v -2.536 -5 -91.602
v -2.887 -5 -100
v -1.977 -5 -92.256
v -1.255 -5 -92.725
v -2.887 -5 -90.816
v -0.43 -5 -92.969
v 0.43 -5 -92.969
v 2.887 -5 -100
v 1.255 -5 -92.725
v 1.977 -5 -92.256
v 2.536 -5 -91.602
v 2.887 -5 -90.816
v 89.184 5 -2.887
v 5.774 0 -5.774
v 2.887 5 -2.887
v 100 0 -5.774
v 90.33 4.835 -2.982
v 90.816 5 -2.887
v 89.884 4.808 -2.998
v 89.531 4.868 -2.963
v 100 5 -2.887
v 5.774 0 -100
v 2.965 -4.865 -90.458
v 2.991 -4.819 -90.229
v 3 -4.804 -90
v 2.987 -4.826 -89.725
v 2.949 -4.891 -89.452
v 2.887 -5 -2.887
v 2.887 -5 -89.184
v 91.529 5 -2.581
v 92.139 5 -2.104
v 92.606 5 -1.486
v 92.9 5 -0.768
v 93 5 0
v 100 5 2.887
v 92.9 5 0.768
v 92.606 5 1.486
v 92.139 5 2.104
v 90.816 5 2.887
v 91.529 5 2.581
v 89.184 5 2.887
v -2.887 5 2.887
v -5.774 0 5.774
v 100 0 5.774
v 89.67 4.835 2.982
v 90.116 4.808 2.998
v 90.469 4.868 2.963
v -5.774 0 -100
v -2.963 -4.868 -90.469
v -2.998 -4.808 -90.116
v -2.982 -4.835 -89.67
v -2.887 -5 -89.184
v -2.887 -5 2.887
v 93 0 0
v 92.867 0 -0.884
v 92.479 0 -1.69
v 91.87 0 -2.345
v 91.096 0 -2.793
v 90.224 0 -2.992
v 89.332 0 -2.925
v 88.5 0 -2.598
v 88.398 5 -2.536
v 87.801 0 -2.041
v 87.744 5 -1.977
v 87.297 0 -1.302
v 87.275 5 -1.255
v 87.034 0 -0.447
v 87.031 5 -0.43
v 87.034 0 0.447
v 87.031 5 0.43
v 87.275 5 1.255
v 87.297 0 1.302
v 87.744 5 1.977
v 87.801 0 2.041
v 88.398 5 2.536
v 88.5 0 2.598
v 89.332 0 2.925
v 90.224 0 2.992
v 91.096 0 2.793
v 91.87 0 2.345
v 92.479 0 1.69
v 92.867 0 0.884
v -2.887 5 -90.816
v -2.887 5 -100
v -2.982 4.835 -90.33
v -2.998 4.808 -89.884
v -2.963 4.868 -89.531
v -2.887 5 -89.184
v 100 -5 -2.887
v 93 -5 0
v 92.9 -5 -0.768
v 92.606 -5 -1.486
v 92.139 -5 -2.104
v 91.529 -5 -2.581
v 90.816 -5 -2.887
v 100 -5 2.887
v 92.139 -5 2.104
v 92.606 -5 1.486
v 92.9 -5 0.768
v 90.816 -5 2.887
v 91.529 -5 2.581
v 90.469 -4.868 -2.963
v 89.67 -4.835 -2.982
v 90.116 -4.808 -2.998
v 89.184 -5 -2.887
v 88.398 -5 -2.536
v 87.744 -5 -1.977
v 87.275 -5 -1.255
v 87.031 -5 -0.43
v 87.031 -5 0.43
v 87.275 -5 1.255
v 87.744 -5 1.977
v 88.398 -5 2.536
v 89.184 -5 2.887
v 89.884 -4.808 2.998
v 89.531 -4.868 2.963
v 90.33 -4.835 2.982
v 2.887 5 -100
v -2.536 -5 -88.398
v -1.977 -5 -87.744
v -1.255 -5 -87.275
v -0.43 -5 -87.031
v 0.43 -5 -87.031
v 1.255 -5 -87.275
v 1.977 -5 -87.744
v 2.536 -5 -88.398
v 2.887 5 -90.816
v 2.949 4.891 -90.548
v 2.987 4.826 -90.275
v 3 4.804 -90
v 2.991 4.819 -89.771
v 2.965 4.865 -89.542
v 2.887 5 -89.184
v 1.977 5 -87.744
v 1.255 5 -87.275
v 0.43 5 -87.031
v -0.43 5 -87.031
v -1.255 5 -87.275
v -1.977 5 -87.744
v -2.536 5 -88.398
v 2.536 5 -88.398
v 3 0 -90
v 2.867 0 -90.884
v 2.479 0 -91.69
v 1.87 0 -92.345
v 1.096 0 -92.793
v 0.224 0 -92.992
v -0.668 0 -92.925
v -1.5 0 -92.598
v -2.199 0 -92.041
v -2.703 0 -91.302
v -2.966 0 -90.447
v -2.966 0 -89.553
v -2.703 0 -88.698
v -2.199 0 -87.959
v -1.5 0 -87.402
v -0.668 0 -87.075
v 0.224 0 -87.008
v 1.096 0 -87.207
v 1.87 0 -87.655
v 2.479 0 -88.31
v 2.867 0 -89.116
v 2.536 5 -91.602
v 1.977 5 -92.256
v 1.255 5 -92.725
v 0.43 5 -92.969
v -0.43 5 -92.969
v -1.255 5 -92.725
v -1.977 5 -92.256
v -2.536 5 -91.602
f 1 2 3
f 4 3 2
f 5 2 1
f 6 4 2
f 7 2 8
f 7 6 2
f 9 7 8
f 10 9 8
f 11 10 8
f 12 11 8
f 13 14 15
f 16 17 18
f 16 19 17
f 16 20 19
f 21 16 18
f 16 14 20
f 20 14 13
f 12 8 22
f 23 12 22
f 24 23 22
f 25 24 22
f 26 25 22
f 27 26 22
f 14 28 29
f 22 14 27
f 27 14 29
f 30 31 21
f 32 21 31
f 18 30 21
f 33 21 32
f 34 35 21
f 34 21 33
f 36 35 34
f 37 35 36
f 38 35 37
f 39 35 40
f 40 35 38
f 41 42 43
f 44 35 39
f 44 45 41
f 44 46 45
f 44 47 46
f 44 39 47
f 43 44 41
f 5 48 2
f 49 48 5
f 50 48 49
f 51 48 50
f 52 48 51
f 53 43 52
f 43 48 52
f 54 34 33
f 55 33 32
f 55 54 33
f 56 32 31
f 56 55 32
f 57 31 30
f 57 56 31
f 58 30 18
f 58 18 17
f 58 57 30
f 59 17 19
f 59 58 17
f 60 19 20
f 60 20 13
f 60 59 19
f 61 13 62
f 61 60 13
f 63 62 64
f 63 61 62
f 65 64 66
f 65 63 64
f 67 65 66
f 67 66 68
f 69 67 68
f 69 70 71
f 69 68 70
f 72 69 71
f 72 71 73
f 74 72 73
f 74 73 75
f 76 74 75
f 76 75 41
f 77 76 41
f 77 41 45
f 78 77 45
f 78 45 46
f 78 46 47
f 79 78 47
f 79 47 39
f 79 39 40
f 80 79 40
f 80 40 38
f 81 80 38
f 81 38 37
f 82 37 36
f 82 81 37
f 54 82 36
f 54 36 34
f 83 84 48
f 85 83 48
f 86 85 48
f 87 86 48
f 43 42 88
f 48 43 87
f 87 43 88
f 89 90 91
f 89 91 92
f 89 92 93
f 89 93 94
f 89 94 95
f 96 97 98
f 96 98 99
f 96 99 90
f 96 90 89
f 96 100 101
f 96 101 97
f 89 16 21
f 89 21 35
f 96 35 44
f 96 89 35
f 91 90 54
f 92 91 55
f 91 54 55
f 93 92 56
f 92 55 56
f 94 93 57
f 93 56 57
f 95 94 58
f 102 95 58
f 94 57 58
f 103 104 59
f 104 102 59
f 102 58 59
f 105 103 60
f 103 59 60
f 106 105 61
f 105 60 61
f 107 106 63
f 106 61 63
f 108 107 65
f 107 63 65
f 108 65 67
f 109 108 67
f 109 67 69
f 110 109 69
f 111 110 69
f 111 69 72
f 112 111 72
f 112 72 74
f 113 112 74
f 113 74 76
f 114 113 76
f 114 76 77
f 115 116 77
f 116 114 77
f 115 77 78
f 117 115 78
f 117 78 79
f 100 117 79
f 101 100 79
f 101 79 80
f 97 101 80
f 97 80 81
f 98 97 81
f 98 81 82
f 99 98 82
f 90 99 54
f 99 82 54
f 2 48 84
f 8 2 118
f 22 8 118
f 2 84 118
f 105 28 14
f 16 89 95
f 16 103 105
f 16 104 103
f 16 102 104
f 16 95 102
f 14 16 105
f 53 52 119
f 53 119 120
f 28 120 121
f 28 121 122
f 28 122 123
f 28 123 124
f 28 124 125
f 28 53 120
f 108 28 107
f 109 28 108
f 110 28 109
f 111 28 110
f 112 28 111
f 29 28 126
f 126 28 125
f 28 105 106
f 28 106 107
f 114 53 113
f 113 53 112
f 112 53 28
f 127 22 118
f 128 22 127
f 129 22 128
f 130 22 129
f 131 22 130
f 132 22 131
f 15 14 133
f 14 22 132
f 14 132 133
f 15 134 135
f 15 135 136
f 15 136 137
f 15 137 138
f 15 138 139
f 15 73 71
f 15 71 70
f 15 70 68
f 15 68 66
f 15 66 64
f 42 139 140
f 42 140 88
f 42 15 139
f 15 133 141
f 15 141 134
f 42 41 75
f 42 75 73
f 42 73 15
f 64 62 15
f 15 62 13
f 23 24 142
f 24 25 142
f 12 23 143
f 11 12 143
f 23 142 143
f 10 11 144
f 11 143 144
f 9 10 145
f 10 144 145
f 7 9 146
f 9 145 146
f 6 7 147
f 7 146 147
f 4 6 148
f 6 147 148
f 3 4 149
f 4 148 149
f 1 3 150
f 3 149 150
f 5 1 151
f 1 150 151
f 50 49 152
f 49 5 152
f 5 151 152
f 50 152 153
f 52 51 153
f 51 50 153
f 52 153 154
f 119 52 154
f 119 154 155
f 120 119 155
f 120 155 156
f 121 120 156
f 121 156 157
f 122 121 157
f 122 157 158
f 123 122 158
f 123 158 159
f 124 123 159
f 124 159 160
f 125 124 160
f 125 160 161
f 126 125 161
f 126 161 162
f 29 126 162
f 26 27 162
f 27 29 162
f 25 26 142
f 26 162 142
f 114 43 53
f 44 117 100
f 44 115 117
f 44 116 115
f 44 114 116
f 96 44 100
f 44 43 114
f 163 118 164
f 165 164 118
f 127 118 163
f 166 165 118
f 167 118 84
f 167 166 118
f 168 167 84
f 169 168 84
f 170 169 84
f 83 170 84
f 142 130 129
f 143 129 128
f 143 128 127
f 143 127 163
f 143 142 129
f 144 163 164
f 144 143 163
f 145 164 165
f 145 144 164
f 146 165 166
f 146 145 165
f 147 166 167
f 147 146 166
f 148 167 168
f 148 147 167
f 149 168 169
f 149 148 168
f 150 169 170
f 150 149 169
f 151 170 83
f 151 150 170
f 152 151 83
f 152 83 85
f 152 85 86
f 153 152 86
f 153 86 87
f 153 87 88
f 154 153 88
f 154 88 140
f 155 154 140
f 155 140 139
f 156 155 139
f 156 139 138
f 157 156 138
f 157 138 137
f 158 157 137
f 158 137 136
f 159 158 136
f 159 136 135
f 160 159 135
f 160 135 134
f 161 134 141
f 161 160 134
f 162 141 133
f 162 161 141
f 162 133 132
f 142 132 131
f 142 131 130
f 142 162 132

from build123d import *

# Parameters (mm, degrees)
SKETCH3_R               = 3
CUT_EXTRUDE1_DEPTH      = 6
CUT_EXTRUDE1_DEPTH_BACK = 6


with BuildPart() as part:
    # Sweep1: sweep along a path in Sketch1
    with BuildLine(Plane(origin=(0, 0, 0), x_dir=(1, 0, 0), z_dir=(0, 1, 0))) as sweep1_path:
        Line((0, 100), (0, 0))
        Line((0, 0), (100, 0))
    # Sketch2 → Sweep1 (sweep)
    with BuildSketch(Plane.XY.offset(-100)):
        Polygon((5.773502692, 0), (2.886751346, 5), (-2.886751346, 5), (-5.773502692, 0), (-2.886751346, -5), (2.886751346, -5), align=None)
    sweep(path=sweep1_path.line, transition=Transition.RIGHT)

    # Sketch3 → Cut-Extrude1 (cut, two sides)
    with BuildSketch(Plane(origin=(0, 0, 0), x_dir=(1, 0, 0), z_dir=(0, 1, 0))) as cut_extrude1_sk:
        with Locations((0, 90)):
            Circle(SKETCH3_R)
        with Locations((90, 0)):
            Circle(SKETCH3_R)
    extrude(amount=CUT_EXTRUDE1_DEPTH, mode=Mode.SUBTRACT)
    extrude(cut_extrude1_sk.sketch, amount=-CUT_EXTRUDE1_DEPTH_BACK, mode=Mode.SUBTRACT)


solid = part.part
